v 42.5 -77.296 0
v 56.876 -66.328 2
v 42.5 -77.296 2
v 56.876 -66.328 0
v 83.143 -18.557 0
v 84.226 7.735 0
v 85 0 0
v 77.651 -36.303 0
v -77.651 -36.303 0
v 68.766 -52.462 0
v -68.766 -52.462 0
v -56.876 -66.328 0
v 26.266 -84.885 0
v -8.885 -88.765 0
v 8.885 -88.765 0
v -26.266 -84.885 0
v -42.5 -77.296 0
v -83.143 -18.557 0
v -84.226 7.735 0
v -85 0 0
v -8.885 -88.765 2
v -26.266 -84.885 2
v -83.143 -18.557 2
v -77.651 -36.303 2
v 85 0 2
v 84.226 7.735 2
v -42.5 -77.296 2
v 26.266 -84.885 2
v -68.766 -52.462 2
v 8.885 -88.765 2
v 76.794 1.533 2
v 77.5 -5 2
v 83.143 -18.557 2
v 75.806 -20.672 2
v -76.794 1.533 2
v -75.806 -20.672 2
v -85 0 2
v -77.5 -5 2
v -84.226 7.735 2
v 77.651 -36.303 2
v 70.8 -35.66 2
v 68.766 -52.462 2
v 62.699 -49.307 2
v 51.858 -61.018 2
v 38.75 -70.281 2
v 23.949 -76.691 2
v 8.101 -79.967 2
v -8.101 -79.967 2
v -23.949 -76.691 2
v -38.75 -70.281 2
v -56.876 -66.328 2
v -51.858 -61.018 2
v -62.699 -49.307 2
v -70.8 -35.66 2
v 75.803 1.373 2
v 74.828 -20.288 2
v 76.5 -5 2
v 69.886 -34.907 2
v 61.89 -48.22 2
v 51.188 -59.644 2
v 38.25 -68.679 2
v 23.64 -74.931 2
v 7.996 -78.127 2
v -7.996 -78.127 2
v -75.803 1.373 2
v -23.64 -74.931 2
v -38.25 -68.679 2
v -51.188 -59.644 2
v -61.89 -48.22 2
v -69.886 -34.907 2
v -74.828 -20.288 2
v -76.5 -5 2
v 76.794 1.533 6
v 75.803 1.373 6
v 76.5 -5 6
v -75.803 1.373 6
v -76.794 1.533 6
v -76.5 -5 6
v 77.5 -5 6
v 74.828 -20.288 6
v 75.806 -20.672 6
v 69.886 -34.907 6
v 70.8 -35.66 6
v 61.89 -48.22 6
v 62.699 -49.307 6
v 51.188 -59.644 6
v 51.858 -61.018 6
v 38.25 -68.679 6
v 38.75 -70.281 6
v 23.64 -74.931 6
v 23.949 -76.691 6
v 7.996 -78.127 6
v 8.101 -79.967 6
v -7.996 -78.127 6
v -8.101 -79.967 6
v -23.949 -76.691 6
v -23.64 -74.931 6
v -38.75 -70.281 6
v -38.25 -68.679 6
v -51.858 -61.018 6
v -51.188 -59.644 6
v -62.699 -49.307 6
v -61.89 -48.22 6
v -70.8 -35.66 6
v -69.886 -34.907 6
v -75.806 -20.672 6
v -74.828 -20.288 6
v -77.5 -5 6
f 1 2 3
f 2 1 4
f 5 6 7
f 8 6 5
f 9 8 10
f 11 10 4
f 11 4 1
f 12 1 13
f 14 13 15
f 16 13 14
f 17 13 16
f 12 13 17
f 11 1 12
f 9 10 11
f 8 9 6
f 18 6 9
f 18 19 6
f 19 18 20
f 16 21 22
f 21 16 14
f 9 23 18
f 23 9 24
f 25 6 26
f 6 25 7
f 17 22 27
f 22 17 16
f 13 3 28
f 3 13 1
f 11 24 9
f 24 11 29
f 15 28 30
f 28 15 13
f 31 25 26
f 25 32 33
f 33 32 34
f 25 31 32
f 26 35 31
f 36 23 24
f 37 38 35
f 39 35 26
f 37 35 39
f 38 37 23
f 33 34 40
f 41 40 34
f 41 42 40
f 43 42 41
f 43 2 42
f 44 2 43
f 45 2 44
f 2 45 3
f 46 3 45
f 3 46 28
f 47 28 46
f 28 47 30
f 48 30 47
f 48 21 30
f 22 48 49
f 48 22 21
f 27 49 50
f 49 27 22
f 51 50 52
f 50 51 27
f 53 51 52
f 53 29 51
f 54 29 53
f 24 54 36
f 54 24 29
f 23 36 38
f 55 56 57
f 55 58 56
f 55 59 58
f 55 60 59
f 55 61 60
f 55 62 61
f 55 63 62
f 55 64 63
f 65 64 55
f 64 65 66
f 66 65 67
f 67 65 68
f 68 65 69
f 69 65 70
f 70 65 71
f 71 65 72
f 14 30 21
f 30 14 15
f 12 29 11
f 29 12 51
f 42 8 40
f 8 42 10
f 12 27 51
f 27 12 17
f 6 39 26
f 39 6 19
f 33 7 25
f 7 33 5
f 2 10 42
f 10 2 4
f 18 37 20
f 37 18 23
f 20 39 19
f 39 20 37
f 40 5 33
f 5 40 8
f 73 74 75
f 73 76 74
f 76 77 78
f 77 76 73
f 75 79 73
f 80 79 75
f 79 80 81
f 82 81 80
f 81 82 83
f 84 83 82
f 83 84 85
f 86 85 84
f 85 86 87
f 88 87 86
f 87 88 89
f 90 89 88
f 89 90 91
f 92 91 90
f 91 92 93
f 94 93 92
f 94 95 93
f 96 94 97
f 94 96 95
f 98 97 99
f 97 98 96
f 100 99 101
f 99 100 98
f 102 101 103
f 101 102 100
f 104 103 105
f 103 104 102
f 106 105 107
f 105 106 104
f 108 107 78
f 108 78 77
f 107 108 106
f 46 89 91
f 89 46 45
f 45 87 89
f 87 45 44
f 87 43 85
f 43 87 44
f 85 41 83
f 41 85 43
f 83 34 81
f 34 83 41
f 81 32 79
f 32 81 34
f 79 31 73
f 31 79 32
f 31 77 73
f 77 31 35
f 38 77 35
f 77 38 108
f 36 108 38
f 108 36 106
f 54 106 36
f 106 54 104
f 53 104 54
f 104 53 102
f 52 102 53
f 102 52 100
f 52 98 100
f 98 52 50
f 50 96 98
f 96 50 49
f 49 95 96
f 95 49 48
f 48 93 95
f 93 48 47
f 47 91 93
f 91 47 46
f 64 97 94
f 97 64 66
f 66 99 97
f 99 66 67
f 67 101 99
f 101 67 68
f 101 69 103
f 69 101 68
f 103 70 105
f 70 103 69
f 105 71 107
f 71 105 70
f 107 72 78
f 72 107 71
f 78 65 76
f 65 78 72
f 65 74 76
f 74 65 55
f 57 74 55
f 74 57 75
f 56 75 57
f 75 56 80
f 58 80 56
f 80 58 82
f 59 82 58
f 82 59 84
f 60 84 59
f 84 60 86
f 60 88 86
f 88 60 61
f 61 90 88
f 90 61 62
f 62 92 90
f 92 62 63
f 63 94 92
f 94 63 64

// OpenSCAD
// file: support/arc.scad
module arc(inner_r, wall, angle, align="inside") {
  abs_angle = abs(angle) % 360;
  dia = inner_r*2;

  // 360 degrees is 2𝜋 radians
  // x=5 cos 𝜃
  // y=5 sin 𝜃

  points = [
    [0, 0],
    for (i=[360:-90:abs_angle]) [(dia * cos(i)), dia * sin(i)],
    [dia * cos(abs_angle), dia * sin(abs_angle)]
  ];

  offset = align == "inside"
    ? 0
    : align == "outside"
    ? wall
    : align == "middle"
    ? wall/2
    : 0;

  difference() {
    circle(r=inner_r + wall - offset);

    circle(r=inner_r - offset);

    rotate([0, 0, abs_angle > angle ? angle : 0]) {
      polygon(points);
    }
  }
}
// file: support/arc_rad_from_wh.scad
function arc_rad_from_wh(w, h) = (h/2) + (pow(w, 2) / (8*h));
// main file
include <support/arc_rad_from_wh.scad>
include <support/arc.scad>

w = 155;
h = 81.5;
offset = 5;
wo = w + offset;
ho = h + offset;
sw = w - offset;
sh = h - offset;
wall = 2;

arc_rad = arc_rad_from_wh(w - offset, h - offset);

module hole() {
  difference() {
    circle(r=sw/2);

    translate([-wo/2, -sw/2 + h, 0])
    square([wo, wo]);
  }
}

linear_extrude(wall)
resize([wo + 10, ho + 10, 1]) {
  hole();
}

translate([0, -5, wall])
linear_extrude(wall*2)
difference() {
  resize([w, h, 1]) {
    hole();
  }

  resize([w - wall, h - wall, 1]) {
    hole();
  }
}
